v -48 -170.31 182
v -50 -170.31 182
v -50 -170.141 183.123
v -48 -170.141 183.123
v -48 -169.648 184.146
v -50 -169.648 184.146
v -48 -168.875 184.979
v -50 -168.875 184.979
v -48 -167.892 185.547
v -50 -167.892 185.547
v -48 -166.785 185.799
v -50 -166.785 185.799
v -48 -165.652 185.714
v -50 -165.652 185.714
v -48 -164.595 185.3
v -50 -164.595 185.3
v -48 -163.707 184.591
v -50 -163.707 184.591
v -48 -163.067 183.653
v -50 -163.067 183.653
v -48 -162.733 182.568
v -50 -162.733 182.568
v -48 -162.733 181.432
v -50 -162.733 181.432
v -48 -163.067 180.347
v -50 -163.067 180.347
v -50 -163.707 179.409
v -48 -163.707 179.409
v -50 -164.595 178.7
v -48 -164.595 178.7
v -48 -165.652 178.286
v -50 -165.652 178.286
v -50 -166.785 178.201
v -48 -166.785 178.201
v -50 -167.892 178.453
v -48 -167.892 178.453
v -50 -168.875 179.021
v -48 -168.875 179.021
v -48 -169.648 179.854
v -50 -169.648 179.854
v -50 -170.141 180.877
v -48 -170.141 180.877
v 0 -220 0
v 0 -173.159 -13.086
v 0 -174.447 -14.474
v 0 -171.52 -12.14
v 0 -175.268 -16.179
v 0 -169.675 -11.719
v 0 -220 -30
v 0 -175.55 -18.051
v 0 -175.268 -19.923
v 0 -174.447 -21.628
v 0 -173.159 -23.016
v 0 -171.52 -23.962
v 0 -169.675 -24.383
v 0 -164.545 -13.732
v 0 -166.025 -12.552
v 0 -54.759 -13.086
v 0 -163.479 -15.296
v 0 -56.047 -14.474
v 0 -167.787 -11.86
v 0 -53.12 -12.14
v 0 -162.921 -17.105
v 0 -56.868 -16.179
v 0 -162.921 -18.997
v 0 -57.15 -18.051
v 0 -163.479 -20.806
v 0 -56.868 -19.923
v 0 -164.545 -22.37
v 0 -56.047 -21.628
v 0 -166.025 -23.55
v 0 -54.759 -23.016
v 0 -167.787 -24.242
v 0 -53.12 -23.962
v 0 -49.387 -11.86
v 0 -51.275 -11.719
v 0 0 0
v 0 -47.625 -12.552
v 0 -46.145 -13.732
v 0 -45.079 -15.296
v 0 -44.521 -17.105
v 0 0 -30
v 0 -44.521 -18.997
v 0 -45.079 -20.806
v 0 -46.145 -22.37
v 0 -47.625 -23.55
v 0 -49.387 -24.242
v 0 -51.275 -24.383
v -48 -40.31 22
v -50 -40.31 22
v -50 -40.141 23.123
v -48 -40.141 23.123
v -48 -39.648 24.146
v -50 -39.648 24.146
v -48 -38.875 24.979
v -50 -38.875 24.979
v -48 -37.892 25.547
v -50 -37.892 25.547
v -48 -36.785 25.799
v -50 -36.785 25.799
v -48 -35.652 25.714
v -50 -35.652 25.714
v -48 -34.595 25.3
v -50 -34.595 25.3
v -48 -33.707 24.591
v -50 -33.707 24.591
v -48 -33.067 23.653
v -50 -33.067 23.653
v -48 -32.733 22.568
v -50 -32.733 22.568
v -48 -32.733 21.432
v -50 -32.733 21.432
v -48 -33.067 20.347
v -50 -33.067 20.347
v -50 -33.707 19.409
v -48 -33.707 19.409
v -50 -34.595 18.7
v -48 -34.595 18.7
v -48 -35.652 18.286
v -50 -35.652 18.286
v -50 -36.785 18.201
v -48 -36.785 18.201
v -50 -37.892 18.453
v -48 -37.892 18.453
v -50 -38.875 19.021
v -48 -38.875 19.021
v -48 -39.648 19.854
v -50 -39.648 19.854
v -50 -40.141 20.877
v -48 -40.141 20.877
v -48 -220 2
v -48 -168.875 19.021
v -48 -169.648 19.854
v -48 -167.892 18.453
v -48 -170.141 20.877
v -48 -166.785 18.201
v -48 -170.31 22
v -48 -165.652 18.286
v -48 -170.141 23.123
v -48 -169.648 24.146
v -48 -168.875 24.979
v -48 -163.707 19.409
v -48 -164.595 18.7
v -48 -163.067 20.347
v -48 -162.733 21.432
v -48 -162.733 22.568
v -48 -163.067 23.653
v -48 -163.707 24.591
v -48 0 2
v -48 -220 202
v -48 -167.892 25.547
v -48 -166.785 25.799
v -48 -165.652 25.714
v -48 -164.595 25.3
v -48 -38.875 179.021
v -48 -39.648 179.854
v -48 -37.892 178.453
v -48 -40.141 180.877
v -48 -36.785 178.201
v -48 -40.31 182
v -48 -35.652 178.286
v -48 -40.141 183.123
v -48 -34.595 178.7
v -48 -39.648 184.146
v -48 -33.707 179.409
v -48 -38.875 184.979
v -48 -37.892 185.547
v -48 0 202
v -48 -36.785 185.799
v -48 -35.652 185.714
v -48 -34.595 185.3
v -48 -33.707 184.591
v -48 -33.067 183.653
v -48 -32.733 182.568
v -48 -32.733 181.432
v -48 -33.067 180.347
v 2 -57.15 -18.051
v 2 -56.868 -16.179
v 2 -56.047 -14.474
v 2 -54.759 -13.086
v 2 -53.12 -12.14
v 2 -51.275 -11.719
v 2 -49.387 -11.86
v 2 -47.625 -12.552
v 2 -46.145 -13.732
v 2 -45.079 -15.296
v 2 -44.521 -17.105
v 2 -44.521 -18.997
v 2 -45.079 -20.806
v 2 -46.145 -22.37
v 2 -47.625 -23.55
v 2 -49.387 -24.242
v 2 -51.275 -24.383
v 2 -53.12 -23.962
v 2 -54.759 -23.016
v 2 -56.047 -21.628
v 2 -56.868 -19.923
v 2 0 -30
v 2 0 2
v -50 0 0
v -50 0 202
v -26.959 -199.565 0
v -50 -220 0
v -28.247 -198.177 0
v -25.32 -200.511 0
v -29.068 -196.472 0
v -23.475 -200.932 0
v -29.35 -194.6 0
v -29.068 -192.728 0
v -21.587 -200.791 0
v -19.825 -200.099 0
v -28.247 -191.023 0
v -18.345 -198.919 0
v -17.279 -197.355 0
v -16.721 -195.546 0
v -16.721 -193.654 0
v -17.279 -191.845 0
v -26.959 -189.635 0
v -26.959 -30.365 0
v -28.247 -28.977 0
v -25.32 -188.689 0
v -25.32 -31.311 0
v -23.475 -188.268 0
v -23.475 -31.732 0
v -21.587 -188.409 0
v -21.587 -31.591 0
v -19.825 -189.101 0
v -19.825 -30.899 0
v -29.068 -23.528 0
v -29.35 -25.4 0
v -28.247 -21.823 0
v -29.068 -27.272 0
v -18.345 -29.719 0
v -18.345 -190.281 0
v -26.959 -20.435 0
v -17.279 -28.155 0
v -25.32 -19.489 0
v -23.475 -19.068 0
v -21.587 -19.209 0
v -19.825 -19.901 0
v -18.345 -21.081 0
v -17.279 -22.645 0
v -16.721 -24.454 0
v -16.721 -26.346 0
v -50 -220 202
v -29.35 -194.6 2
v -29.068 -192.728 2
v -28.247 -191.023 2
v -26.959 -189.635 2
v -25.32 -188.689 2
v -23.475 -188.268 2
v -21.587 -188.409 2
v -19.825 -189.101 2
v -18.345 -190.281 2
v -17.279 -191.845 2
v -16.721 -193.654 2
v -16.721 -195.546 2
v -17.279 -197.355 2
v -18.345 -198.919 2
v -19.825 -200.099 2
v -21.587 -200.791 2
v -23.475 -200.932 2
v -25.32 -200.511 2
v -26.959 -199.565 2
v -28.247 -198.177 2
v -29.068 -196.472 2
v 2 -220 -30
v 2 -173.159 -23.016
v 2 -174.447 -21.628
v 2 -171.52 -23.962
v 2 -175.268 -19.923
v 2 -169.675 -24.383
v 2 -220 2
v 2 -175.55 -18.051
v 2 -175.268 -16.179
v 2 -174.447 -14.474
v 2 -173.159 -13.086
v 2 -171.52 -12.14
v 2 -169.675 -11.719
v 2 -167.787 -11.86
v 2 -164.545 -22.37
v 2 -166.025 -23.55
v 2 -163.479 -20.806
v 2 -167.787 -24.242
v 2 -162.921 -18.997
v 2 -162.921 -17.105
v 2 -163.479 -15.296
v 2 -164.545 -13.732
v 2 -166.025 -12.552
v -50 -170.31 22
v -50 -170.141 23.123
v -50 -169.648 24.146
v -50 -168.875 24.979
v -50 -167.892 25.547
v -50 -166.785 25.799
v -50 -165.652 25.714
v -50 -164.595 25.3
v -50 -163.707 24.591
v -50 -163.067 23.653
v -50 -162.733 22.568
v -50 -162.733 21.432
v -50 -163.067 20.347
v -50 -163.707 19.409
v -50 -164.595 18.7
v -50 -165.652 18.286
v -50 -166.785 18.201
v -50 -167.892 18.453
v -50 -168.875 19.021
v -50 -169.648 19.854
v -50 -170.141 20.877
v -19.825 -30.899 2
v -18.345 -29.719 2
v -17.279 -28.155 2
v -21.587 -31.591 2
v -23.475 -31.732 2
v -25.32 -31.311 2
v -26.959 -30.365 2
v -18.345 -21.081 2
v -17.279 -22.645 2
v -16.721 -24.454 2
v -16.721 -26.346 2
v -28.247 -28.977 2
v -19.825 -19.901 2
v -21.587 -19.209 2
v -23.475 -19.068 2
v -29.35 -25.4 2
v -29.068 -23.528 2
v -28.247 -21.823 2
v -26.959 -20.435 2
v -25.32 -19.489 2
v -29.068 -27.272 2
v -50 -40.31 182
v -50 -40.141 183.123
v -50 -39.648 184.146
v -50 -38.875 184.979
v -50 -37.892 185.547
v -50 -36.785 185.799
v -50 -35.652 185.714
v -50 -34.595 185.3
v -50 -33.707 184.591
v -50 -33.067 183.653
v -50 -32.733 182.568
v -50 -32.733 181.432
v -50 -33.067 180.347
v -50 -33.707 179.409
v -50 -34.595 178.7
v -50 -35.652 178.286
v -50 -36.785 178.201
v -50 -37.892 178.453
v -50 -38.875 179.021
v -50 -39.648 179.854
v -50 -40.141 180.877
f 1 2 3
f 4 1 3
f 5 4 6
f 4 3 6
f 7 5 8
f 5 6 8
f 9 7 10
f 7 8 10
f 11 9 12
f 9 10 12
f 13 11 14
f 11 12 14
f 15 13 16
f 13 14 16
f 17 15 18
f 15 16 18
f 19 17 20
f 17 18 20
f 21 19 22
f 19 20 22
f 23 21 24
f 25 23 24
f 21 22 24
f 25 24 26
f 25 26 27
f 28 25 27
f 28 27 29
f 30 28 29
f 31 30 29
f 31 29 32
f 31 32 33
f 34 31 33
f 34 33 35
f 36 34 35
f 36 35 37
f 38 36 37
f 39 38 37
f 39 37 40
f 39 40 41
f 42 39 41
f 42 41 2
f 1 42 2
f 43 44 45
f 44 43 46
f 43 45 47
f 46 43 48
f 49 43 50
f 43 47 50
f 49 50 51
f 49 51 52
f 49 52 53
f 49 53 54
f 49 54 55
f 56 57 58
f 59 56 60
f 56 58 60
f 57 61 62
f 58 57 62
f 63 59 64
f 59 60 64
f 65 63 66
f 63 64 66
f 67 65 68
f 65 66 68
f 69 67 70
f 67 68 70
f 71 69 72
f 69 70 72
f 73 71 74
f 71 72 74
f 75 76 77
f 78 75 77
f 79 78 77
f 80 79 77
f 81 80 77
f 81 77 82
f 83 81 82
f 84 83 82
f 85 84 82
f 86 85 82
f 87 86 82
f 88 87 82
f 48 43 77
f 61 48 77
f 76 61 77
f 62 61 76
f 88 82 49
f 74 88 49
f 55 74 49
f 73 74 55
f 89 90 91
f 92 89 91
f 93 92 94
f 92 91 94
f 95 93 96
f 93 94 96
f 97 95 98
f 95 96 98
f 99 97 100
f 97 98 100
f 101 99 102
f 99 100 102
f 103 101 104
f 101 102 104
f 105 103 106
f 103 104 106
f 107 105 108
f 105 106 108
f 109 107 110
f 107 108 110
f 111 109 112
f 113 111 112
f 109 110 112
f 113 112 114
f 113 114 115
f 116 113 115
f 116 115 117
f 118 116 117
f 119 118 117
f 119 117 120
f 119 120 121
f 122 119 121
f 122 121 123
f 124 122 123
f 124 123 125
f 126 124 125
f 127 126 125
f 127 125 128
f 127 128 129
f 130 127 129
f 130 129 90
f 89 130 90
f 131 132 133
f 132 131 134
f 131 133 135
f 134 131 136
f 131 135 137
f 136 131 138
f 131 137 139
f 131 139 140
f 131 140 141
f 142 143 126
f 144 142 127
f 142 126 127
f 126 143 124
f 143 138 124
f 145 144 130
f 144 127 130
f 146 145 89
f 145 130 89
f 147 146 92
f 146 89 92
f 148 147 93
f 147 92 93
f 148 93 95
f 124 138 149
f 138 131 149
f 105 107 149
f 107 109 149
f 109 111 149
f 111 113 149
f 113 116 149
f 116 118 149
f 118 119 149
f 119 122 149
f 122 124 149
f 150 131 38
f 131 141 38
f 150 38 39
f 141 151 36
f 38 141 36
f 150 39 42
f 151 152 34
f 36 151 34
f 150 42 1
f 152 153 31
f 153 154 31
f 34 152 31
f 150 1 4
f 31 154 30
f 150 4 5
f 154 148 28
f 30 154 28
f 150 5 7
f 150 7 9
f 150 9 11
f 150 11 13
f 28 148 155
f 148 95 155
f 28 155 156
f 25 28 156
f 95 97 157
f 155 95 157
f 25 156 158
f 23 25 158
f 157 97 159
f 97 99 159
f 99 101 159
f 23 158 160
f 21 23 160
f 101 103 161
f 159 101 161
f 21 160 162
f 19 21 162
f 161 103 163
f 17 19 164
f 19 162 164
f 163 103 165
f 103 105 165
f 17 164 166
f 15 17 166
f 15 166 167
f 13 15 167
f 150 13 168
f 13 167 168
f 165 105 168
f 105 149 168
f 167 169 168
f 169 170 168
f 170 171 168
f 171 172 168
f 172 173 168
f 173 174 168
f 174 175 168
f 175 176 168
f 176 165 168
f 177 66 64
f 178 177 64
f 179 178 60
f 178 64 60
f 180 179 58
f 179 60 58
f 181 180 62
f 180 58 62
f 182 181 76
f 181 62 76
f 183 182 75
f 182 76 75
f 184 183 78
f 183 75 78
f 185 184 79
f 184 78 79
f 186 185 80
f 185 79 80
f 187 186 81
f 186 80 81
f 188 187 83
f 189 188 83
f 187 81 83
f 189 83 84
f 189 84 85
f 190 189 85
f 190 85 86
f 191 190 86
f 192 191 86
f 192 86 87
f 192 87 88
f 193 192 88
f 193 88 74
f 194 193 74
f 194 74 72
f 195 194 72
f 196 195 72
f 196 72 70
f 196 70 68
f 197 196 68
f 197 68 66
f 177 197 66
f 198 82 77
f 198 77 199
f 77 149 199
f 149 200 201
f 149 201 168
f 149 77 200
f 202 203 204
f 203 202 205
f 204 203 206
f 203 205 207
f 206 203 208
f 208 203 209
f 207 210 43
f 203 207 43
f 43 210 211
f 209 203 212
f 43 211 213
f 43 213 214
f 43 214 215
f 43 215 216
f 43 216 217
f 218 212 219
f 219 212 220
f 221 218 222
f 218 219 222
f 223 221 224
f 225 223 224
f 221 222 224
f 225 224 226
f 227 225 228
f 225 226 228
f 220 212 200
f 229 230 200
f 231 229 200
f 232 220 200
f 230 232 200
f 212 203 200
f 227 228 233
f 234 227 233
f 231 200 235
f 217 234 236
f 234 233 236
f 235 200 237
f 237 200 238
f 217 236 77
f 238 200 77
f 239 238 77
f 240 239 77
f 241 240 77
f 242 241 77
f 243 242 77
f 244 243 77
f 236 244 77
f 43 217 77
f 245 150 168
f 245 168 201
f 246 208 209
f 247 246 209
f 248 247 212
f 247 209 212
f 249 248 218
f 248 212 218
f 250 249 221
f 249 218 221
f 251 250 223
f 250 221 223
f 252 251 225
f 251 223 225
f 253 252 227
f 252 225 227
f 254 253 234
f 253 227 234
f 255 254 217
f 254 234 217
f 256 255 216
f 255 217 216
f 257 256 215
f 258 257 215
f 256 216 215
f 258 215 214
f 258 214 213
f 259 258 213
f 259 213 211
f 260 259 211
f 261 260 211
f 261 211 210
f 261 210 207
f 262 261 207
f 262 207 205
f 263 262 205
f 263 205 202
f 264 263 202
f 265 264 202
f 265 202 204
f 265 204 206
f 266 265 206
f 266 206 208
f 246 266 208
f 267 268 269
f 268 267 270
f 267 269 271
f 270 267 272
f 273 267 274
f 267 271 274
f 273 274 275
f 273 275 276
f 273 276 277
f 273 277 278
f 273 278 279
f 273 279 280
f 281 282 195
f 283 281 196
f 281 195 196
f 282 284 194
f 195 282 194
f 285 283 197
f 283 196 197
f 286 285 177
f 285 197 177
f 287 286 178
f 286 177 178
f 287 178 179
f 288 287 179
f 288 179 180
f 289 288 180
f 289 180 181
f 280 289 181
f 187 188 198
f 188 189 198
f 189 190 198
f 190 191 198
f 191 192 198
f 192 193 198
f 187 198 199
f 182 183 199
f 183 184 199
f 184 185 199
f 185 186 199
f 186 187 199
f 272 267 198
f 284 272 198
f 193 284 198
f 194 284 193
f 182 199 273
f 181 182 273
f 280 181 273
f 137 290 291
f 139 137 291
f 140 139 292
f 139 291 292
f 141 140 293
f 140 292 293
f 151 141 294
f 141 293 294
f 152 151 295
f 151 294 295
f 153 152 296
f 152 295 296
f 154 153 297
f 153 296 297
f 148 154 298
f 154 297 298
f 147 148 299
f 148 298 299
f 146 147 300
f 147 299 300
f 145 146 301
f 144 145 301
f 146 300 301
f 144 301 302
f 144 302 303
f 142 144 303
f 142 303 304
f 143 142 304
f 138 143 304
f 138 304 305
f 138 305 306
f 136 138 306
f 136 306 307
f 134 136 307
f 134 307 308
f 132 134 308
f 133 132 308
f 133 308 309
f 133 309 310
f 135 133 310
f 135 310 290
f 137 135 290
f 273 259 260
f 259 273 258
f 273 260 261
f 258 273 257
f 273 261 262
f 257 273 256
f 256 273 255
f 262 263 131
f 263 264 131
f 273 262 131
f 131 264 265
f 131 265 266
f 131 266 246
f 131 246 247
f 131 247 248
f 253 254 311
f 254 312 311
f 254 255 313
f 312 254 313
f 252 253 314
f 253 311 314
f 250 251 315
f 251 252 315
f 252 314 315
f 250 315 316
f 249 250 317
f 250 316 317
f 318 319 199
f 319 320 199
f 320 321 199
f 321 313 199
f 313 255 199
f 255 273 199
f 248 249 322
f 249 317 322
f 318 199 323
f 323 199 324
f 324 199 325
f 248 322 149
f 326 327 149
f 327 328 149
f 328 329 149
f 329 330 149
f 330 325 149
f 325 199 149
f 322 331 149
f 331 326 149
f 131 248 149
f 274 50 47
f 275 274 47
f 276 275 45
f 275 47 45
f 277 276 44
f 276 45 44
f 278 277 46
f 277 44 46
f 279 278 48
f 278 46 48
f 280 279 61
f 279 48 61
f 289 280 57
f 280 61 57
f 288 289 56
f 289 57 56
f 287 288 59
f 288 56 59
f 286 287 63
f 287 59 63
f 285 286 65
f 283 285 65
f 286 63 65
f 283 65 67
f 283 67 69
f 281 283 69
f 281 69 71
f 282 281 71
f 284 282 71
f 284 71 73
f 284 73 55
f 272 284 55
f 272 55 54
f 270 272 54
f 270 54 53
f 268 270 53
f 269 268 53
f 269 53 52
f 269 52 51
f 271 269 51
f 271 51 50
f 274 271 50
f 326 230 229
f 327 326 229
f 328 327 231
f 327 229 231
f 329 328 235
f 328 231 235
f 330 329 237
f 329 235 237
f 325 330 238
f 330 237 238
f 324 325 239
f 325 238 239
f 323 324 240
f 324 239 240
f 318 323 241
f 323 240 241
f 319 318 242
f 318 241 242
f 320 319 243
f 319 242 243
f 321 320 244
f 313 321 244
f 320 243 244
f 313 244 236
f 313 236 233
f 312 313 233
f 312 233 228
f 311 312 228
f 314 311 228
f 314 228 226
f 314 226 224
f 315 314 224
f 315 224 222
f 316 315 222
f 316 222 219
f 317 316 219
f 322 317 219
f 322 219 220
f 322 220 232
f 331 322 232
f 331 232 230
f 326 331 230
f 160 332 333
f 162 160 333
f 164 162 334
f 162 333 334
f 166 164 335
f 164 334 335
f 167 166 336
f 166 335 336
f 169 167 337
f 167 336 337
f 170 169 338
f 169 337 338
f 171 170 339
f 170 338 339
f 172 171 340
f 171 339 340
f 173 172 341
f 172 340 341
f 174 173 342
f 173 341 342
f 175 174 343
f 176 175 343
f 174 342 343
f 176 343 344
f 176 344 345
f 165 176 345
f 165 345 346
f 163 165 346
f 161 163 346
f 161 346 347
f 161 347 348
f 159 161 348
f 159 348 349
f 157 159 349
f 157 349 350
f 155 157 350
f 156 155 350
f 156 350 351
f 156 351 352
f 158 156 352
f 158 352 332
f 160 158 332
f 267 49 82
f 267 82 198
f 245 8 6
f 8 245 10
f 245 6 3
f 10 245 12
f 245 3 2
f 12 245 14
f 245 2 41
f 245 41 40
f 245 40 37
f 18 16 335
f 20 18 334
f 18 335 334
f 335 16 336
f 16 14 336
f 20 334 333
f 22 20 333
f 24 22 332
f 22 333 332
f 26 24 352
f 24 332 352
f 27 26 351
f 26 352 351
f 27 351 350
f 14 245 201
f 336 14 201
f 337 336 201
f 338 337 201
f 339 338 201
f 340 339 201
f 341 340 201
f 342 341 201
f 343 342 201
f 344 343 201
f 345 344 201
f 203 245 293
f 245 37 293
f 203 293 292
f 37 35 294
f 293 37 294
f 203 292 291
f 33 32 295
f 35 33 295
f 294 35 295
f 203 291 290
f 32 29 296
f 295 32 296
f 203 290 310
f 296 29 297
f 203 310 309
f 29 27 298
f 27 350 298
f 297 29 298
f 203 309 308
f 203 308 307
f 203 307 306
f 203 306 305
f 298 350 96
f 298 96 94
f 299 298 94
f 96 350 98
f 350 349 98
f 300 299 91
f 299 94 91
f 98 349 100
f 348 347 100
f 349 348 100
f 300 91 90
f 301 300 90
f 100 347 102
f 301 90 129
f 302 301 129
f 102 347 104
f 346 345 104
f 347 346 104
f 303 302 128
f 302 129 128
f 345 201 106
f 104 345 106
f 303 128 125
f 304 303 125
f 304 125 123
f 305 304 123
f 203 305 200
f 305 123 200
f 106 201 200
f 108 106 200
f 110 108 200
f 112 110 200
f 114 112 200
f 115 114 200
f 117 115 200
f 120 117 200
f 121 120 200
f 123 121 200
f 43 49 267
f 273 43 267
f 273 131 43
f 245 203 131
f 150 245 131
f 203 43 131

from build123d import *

# Parameters (mm, degrees)
F1_DEPTH = 220
F3_D     = 12.7
F5_D     = 7.62
F7_D     = 12.7


with BuildPart() as f1:
    # F0 (on Front) → F1 (new body)
    with BuildSketch(Plane.XZ):
        Polygon((0, 0), (0, -30), (2, -30), (2, 2), (-48, 2), (-48, 202), (-50, 202), (-50, 0), align=None)
    extrude(amount=F1_DEPTH)

    # F3 (through all)
    with Locations(Plane.YZ.offset(2)):
        with Locations((-169.2, -18.051046), (-50.8, -18.051046)):
            Hole(F3_D / 2)

    # F5 (through all)
    with Locations(Plane.YZ.offset(-48)):
        with Locations((-166.5, 182), (-36.5, 182), (-36.5, 22), (-166.5, 22)):
            Hole(F5_D / 2)

    # F7 (through all)
    with Locations(Plane.XY.offset(2)):
        with Locations((-23, -25.4), (-23, -194.6)):
            Hole(F7_D / 2)


solid = f1.part
